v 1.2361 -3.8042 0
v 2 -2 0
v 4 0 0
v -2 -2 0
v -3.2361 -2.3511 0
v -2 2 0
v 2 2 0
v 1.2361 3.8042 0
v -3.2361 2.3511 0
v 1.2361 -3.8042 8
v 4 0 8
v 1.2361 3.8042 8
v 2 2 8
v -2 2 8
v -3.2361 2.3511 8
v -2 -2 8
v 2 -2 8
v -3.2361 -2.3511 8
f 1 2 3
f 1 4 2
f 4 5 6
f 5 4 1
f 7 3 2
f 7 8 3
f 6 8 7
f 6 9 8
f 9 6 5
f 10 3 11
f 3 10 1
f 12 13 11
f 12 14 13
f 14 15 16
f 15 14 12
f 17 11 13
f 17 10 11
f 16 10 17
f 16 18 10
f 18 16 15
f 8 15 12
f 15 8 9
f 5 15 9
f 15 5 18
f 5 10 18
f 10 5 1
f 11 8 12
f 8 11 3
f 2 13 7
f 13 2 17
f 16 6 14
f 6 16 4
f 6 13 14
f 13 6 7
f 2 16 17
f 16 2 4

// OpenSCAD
//Outside Shape
outside_shape = 3; // [1:Cylinder, 2:Square, 3:Polygon]

//Inside Shape
inside_shape = 2; // [1:Cylinder, 2:Square, 3:Polygon]

//Outside Polygon sides
outside_polysides = 5; // [5:20]

//Inside Polygon sides
inside_polysides = 5; // [5:20]

//Height
height=8; // [5:50]

//Diameter of Inner Polygon
inside_diameter = 4;

//Diameter of Outer Polygon
outside_diameter = 8;



/* [Hidden] */
$fn=60;


	if (outside_shape == 1){
		if (inside_shape == 1){
			cyl_cyl();
		} else if (inside_shape == 2){
			cyl_squ();
		} else if (inside_shape == 3){
			cyl_poly();
		} else{
			cyl_cyl();
		}
	} else if (outside_shape == 2){
		if (inside_shape == 1){
			squ_cyl();
		} else if (inside_shape == 2){
			squ_squ();
		} else if (inside_shape == 3){
			squ_poly();
		} else{
			squ_cyl();
		}
	} else if (outside_shape == 3){
		if (inside_shape == 1){
			poly_cyl();
		} else if (inside_shape == 2){
			poly_squ();
		} else if (inside_shape == 3){
			poly_poly();
		} else{
			poly_cyl();
		}
	} else{
		cyl_cyl();
	}


//Cylinders

module cyl_cyl(){

	difference() {
	
		cylinder(height,outside_diameter/2,outside_diameter/2);
		cylinder(height,inside_diameter/2,inside_diameter/2);
	
	}

}

module cyl_squ(){

	difference() {
	
		cylinder(height,outside_diameter/2,outside_diameter/2,true);
		translate([-inside_diameter/2,-inside_diameter/2,-height/2])cube([inside_diameter,inside_diameter,height]);
	
	}

}

module cyl_poly(){

	difference() {
	
		cylinder(height,outside_diameter/2,outside_diameter/2);
		linear_extrude(height) circle(inside_diameter/2,$fn=inside_polysides);	
	
	}

}

//Squares

module squ_cyl(){

	difference() {
	
		translate([-outside_diameter/2,-outside_diameter/2,0])cube([outside_diameter,outside_diameter,height]);
		cylinder(height,inside_diameter/2,inside_diameter/2);
	
	}

}

module squ_squ(){

	difference() {
	
		cube([outside_diameter,outside_diameter,height]);
		translate([outside_diameter/2 - inside_diameter/2,outside_diameter/2 - inside_diameter/2,0])cube([inside_diameter,inside_diameter,height]);
	
	}

}

module squ_poly(){

	difference() {
	
		translate([-outside_diameter/2,-outside_diameter/2,0])cube([outside_diameter,outside_diameter,height]);
		linear_extrude(height) circle(inside_diameter/2,$fn=inside_polysides);	
	
	}

}

//Polygons

module poly_cyl(){

	difference() {
	
		linear_extrude(height) circle(outside_diameter/2,$fn=outside_polysides);
		cylinder(height,inside_diameter/2,inside_diameter/2);
	
	}

}

module poly_squ(){

	difference() {
	
		linear_extrude(height) circle(outside_diameter/2,$fn=outside_polysides);
		translate([-inside_diameter/2,-inside_diameter/2,0])cube([inside_diameter,inside_diameter,height]);
	
	}

}

module poly_poly(){

	difference() {
	
		linear_extrude(height) circle(outside_diameter/2,$fn=outside_polysides);
		linear_extrude(height) circle(inside_diameter/2,$fn=inside_polysides);	
	
	}

}
